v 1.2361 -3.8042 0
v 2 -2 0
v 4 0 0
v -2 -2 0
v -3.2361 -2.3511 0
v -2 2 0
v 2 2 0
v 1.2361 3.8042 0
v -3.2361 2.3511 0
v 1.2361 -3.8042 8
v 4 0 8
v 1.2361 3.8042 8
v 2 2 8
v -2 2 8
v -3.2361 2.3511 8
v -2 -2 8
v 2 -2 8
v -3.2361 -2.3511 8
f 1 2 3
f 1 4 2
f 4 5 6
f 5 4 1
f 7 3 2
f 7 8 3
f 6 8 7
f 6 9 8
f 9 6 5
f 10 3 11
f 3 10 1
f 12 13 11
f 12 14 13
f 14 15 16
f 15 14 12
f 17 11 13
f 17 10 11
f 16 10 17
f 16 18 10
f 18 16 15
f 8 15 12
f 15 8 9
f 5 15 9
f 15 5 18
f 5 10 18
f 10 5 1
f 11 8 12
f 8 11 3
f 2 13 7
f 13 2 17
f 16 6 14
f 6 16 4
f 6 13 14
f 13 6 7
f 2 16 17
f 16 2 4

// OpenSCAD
//Outside Shape
outside_shape = 3; // [1:Cylinder, 2:Square, 3:Polygon]

//Inside Shape
inside_shape = 2; // [1:Cylinder, 2:Square, 3:Polygon]

//Outside Polygon sides
outside_polysides = 5; // [5:20]

//Inside Polygon sides
inside_polysides = 5; // [5:20]

//Height
height=8; // [5:50]

//Diameter of Inner Polygon
inside_diameter = 4;

//Diameter of Outer Polygon
outside_diameter = 8;



/* [Hidden] */
$fn=60;


	if (outside_shape == 1){
		if (inside_shape == 1){
			cyl_cyl();
		} else if (inside_shape == 2){
			cyl_squ();
		} else if (inside_shape == 3){
			cyl_poly();
		} else{
			cyl_cyl();
		}
	} else if (outside_shape == 2){
		if (inside_shape == 1){
			squ_cyl();
		} else if (inside_shape == 2){
			squ_squ();
		} else if (inside_shape == 3){
			squ_poly();
		} else{
			squ_cyl();
		}
	} else if (outside_shape == 3){
		if (inside_shape == 1){
			poly_cyl();
		} else if (inside_shape == 2){
			poly_squ();
		} else if (inside_shape == 3){
			poly_poly();
		} else{
			poly_cyl();
		}
	} else{
		cyl_cyl();
	}


//Cylinders

module cyl_cyl(){

	difference() {
	
		cylinder(height,outside_diameter/2,outside_diameter/2);
		cylinder(height,inside_diameter/2,inside_diameter/2);
	
	}

}

module cyl_squ(){

	difference() {
	
		cylinder(height,outside_diameter/2,outside_diameter/2,true);
		translate([-inside_diameter/2,-inside_diameter/2,-height/2])cube([inside_diameter,inside_diameter,height]);
	
	}

}

module cyl_poly(){

	difference() {
	
		cylinder(height,outside_diameter/2,outside_diameter/2);
		linear_extrude(height) circle(inside_diameter/2,$fn=inside_polysides);	
	
	}

}

//Squares

module squ_cyl(){

	difference() {
	
		translate([-outside_diameter/2,-outside_diameter/2,0])cube([outside_diameter,outside_diameter,height]);
		cylinder(height,inside_diameter/2,inside_diameter/2);
	
	}

}

module squ_squ(){

	difference() {
	
		cube([outside_diameter,outside_diameter,height]);
		translate([outside_diameter/2 - inside_diameter/2,outside_diameter/2 - inside_diameter/2,0])cube([inside_diameter,inside_diameter,height]);
	
	}

}

module squ_poly(){

	difference() {
	
		translate([-outside_diameter/2,-outside_diameter/2,0])cube([outside_diameter,outside_diameter,height]);
		linear_extrude(height) circle(inside_diameter/2,$fn=inside_polysides);	
	
	}

}

//Polygons

module poly_cyl(){

	difference() {
	
		linear_extrude(height) circle(outside_diameter/2,$fn=outside_polysides);
		cylinder(height,inside_diameter/2,inside_diameter/2);
	
	}

}

module poly_squ(){

	difference() {
	
		linear_extrude(height) circle(outside_diameter/2,$fn=outside_polysides);
		translate([-inside_diameter/2,-inside_diameter/2,0])cube([inside_diameter,inside_diameter,height]);
	
	}

}

module poly_poly(){

	difference() {
	
		linear_extrude(height) circle(outside_diameter/2,$fn=outside_polysides);
		linear_extrude(height) circle(inside_diameter/2,$fn=inside_polysides);	
	
	}

}
